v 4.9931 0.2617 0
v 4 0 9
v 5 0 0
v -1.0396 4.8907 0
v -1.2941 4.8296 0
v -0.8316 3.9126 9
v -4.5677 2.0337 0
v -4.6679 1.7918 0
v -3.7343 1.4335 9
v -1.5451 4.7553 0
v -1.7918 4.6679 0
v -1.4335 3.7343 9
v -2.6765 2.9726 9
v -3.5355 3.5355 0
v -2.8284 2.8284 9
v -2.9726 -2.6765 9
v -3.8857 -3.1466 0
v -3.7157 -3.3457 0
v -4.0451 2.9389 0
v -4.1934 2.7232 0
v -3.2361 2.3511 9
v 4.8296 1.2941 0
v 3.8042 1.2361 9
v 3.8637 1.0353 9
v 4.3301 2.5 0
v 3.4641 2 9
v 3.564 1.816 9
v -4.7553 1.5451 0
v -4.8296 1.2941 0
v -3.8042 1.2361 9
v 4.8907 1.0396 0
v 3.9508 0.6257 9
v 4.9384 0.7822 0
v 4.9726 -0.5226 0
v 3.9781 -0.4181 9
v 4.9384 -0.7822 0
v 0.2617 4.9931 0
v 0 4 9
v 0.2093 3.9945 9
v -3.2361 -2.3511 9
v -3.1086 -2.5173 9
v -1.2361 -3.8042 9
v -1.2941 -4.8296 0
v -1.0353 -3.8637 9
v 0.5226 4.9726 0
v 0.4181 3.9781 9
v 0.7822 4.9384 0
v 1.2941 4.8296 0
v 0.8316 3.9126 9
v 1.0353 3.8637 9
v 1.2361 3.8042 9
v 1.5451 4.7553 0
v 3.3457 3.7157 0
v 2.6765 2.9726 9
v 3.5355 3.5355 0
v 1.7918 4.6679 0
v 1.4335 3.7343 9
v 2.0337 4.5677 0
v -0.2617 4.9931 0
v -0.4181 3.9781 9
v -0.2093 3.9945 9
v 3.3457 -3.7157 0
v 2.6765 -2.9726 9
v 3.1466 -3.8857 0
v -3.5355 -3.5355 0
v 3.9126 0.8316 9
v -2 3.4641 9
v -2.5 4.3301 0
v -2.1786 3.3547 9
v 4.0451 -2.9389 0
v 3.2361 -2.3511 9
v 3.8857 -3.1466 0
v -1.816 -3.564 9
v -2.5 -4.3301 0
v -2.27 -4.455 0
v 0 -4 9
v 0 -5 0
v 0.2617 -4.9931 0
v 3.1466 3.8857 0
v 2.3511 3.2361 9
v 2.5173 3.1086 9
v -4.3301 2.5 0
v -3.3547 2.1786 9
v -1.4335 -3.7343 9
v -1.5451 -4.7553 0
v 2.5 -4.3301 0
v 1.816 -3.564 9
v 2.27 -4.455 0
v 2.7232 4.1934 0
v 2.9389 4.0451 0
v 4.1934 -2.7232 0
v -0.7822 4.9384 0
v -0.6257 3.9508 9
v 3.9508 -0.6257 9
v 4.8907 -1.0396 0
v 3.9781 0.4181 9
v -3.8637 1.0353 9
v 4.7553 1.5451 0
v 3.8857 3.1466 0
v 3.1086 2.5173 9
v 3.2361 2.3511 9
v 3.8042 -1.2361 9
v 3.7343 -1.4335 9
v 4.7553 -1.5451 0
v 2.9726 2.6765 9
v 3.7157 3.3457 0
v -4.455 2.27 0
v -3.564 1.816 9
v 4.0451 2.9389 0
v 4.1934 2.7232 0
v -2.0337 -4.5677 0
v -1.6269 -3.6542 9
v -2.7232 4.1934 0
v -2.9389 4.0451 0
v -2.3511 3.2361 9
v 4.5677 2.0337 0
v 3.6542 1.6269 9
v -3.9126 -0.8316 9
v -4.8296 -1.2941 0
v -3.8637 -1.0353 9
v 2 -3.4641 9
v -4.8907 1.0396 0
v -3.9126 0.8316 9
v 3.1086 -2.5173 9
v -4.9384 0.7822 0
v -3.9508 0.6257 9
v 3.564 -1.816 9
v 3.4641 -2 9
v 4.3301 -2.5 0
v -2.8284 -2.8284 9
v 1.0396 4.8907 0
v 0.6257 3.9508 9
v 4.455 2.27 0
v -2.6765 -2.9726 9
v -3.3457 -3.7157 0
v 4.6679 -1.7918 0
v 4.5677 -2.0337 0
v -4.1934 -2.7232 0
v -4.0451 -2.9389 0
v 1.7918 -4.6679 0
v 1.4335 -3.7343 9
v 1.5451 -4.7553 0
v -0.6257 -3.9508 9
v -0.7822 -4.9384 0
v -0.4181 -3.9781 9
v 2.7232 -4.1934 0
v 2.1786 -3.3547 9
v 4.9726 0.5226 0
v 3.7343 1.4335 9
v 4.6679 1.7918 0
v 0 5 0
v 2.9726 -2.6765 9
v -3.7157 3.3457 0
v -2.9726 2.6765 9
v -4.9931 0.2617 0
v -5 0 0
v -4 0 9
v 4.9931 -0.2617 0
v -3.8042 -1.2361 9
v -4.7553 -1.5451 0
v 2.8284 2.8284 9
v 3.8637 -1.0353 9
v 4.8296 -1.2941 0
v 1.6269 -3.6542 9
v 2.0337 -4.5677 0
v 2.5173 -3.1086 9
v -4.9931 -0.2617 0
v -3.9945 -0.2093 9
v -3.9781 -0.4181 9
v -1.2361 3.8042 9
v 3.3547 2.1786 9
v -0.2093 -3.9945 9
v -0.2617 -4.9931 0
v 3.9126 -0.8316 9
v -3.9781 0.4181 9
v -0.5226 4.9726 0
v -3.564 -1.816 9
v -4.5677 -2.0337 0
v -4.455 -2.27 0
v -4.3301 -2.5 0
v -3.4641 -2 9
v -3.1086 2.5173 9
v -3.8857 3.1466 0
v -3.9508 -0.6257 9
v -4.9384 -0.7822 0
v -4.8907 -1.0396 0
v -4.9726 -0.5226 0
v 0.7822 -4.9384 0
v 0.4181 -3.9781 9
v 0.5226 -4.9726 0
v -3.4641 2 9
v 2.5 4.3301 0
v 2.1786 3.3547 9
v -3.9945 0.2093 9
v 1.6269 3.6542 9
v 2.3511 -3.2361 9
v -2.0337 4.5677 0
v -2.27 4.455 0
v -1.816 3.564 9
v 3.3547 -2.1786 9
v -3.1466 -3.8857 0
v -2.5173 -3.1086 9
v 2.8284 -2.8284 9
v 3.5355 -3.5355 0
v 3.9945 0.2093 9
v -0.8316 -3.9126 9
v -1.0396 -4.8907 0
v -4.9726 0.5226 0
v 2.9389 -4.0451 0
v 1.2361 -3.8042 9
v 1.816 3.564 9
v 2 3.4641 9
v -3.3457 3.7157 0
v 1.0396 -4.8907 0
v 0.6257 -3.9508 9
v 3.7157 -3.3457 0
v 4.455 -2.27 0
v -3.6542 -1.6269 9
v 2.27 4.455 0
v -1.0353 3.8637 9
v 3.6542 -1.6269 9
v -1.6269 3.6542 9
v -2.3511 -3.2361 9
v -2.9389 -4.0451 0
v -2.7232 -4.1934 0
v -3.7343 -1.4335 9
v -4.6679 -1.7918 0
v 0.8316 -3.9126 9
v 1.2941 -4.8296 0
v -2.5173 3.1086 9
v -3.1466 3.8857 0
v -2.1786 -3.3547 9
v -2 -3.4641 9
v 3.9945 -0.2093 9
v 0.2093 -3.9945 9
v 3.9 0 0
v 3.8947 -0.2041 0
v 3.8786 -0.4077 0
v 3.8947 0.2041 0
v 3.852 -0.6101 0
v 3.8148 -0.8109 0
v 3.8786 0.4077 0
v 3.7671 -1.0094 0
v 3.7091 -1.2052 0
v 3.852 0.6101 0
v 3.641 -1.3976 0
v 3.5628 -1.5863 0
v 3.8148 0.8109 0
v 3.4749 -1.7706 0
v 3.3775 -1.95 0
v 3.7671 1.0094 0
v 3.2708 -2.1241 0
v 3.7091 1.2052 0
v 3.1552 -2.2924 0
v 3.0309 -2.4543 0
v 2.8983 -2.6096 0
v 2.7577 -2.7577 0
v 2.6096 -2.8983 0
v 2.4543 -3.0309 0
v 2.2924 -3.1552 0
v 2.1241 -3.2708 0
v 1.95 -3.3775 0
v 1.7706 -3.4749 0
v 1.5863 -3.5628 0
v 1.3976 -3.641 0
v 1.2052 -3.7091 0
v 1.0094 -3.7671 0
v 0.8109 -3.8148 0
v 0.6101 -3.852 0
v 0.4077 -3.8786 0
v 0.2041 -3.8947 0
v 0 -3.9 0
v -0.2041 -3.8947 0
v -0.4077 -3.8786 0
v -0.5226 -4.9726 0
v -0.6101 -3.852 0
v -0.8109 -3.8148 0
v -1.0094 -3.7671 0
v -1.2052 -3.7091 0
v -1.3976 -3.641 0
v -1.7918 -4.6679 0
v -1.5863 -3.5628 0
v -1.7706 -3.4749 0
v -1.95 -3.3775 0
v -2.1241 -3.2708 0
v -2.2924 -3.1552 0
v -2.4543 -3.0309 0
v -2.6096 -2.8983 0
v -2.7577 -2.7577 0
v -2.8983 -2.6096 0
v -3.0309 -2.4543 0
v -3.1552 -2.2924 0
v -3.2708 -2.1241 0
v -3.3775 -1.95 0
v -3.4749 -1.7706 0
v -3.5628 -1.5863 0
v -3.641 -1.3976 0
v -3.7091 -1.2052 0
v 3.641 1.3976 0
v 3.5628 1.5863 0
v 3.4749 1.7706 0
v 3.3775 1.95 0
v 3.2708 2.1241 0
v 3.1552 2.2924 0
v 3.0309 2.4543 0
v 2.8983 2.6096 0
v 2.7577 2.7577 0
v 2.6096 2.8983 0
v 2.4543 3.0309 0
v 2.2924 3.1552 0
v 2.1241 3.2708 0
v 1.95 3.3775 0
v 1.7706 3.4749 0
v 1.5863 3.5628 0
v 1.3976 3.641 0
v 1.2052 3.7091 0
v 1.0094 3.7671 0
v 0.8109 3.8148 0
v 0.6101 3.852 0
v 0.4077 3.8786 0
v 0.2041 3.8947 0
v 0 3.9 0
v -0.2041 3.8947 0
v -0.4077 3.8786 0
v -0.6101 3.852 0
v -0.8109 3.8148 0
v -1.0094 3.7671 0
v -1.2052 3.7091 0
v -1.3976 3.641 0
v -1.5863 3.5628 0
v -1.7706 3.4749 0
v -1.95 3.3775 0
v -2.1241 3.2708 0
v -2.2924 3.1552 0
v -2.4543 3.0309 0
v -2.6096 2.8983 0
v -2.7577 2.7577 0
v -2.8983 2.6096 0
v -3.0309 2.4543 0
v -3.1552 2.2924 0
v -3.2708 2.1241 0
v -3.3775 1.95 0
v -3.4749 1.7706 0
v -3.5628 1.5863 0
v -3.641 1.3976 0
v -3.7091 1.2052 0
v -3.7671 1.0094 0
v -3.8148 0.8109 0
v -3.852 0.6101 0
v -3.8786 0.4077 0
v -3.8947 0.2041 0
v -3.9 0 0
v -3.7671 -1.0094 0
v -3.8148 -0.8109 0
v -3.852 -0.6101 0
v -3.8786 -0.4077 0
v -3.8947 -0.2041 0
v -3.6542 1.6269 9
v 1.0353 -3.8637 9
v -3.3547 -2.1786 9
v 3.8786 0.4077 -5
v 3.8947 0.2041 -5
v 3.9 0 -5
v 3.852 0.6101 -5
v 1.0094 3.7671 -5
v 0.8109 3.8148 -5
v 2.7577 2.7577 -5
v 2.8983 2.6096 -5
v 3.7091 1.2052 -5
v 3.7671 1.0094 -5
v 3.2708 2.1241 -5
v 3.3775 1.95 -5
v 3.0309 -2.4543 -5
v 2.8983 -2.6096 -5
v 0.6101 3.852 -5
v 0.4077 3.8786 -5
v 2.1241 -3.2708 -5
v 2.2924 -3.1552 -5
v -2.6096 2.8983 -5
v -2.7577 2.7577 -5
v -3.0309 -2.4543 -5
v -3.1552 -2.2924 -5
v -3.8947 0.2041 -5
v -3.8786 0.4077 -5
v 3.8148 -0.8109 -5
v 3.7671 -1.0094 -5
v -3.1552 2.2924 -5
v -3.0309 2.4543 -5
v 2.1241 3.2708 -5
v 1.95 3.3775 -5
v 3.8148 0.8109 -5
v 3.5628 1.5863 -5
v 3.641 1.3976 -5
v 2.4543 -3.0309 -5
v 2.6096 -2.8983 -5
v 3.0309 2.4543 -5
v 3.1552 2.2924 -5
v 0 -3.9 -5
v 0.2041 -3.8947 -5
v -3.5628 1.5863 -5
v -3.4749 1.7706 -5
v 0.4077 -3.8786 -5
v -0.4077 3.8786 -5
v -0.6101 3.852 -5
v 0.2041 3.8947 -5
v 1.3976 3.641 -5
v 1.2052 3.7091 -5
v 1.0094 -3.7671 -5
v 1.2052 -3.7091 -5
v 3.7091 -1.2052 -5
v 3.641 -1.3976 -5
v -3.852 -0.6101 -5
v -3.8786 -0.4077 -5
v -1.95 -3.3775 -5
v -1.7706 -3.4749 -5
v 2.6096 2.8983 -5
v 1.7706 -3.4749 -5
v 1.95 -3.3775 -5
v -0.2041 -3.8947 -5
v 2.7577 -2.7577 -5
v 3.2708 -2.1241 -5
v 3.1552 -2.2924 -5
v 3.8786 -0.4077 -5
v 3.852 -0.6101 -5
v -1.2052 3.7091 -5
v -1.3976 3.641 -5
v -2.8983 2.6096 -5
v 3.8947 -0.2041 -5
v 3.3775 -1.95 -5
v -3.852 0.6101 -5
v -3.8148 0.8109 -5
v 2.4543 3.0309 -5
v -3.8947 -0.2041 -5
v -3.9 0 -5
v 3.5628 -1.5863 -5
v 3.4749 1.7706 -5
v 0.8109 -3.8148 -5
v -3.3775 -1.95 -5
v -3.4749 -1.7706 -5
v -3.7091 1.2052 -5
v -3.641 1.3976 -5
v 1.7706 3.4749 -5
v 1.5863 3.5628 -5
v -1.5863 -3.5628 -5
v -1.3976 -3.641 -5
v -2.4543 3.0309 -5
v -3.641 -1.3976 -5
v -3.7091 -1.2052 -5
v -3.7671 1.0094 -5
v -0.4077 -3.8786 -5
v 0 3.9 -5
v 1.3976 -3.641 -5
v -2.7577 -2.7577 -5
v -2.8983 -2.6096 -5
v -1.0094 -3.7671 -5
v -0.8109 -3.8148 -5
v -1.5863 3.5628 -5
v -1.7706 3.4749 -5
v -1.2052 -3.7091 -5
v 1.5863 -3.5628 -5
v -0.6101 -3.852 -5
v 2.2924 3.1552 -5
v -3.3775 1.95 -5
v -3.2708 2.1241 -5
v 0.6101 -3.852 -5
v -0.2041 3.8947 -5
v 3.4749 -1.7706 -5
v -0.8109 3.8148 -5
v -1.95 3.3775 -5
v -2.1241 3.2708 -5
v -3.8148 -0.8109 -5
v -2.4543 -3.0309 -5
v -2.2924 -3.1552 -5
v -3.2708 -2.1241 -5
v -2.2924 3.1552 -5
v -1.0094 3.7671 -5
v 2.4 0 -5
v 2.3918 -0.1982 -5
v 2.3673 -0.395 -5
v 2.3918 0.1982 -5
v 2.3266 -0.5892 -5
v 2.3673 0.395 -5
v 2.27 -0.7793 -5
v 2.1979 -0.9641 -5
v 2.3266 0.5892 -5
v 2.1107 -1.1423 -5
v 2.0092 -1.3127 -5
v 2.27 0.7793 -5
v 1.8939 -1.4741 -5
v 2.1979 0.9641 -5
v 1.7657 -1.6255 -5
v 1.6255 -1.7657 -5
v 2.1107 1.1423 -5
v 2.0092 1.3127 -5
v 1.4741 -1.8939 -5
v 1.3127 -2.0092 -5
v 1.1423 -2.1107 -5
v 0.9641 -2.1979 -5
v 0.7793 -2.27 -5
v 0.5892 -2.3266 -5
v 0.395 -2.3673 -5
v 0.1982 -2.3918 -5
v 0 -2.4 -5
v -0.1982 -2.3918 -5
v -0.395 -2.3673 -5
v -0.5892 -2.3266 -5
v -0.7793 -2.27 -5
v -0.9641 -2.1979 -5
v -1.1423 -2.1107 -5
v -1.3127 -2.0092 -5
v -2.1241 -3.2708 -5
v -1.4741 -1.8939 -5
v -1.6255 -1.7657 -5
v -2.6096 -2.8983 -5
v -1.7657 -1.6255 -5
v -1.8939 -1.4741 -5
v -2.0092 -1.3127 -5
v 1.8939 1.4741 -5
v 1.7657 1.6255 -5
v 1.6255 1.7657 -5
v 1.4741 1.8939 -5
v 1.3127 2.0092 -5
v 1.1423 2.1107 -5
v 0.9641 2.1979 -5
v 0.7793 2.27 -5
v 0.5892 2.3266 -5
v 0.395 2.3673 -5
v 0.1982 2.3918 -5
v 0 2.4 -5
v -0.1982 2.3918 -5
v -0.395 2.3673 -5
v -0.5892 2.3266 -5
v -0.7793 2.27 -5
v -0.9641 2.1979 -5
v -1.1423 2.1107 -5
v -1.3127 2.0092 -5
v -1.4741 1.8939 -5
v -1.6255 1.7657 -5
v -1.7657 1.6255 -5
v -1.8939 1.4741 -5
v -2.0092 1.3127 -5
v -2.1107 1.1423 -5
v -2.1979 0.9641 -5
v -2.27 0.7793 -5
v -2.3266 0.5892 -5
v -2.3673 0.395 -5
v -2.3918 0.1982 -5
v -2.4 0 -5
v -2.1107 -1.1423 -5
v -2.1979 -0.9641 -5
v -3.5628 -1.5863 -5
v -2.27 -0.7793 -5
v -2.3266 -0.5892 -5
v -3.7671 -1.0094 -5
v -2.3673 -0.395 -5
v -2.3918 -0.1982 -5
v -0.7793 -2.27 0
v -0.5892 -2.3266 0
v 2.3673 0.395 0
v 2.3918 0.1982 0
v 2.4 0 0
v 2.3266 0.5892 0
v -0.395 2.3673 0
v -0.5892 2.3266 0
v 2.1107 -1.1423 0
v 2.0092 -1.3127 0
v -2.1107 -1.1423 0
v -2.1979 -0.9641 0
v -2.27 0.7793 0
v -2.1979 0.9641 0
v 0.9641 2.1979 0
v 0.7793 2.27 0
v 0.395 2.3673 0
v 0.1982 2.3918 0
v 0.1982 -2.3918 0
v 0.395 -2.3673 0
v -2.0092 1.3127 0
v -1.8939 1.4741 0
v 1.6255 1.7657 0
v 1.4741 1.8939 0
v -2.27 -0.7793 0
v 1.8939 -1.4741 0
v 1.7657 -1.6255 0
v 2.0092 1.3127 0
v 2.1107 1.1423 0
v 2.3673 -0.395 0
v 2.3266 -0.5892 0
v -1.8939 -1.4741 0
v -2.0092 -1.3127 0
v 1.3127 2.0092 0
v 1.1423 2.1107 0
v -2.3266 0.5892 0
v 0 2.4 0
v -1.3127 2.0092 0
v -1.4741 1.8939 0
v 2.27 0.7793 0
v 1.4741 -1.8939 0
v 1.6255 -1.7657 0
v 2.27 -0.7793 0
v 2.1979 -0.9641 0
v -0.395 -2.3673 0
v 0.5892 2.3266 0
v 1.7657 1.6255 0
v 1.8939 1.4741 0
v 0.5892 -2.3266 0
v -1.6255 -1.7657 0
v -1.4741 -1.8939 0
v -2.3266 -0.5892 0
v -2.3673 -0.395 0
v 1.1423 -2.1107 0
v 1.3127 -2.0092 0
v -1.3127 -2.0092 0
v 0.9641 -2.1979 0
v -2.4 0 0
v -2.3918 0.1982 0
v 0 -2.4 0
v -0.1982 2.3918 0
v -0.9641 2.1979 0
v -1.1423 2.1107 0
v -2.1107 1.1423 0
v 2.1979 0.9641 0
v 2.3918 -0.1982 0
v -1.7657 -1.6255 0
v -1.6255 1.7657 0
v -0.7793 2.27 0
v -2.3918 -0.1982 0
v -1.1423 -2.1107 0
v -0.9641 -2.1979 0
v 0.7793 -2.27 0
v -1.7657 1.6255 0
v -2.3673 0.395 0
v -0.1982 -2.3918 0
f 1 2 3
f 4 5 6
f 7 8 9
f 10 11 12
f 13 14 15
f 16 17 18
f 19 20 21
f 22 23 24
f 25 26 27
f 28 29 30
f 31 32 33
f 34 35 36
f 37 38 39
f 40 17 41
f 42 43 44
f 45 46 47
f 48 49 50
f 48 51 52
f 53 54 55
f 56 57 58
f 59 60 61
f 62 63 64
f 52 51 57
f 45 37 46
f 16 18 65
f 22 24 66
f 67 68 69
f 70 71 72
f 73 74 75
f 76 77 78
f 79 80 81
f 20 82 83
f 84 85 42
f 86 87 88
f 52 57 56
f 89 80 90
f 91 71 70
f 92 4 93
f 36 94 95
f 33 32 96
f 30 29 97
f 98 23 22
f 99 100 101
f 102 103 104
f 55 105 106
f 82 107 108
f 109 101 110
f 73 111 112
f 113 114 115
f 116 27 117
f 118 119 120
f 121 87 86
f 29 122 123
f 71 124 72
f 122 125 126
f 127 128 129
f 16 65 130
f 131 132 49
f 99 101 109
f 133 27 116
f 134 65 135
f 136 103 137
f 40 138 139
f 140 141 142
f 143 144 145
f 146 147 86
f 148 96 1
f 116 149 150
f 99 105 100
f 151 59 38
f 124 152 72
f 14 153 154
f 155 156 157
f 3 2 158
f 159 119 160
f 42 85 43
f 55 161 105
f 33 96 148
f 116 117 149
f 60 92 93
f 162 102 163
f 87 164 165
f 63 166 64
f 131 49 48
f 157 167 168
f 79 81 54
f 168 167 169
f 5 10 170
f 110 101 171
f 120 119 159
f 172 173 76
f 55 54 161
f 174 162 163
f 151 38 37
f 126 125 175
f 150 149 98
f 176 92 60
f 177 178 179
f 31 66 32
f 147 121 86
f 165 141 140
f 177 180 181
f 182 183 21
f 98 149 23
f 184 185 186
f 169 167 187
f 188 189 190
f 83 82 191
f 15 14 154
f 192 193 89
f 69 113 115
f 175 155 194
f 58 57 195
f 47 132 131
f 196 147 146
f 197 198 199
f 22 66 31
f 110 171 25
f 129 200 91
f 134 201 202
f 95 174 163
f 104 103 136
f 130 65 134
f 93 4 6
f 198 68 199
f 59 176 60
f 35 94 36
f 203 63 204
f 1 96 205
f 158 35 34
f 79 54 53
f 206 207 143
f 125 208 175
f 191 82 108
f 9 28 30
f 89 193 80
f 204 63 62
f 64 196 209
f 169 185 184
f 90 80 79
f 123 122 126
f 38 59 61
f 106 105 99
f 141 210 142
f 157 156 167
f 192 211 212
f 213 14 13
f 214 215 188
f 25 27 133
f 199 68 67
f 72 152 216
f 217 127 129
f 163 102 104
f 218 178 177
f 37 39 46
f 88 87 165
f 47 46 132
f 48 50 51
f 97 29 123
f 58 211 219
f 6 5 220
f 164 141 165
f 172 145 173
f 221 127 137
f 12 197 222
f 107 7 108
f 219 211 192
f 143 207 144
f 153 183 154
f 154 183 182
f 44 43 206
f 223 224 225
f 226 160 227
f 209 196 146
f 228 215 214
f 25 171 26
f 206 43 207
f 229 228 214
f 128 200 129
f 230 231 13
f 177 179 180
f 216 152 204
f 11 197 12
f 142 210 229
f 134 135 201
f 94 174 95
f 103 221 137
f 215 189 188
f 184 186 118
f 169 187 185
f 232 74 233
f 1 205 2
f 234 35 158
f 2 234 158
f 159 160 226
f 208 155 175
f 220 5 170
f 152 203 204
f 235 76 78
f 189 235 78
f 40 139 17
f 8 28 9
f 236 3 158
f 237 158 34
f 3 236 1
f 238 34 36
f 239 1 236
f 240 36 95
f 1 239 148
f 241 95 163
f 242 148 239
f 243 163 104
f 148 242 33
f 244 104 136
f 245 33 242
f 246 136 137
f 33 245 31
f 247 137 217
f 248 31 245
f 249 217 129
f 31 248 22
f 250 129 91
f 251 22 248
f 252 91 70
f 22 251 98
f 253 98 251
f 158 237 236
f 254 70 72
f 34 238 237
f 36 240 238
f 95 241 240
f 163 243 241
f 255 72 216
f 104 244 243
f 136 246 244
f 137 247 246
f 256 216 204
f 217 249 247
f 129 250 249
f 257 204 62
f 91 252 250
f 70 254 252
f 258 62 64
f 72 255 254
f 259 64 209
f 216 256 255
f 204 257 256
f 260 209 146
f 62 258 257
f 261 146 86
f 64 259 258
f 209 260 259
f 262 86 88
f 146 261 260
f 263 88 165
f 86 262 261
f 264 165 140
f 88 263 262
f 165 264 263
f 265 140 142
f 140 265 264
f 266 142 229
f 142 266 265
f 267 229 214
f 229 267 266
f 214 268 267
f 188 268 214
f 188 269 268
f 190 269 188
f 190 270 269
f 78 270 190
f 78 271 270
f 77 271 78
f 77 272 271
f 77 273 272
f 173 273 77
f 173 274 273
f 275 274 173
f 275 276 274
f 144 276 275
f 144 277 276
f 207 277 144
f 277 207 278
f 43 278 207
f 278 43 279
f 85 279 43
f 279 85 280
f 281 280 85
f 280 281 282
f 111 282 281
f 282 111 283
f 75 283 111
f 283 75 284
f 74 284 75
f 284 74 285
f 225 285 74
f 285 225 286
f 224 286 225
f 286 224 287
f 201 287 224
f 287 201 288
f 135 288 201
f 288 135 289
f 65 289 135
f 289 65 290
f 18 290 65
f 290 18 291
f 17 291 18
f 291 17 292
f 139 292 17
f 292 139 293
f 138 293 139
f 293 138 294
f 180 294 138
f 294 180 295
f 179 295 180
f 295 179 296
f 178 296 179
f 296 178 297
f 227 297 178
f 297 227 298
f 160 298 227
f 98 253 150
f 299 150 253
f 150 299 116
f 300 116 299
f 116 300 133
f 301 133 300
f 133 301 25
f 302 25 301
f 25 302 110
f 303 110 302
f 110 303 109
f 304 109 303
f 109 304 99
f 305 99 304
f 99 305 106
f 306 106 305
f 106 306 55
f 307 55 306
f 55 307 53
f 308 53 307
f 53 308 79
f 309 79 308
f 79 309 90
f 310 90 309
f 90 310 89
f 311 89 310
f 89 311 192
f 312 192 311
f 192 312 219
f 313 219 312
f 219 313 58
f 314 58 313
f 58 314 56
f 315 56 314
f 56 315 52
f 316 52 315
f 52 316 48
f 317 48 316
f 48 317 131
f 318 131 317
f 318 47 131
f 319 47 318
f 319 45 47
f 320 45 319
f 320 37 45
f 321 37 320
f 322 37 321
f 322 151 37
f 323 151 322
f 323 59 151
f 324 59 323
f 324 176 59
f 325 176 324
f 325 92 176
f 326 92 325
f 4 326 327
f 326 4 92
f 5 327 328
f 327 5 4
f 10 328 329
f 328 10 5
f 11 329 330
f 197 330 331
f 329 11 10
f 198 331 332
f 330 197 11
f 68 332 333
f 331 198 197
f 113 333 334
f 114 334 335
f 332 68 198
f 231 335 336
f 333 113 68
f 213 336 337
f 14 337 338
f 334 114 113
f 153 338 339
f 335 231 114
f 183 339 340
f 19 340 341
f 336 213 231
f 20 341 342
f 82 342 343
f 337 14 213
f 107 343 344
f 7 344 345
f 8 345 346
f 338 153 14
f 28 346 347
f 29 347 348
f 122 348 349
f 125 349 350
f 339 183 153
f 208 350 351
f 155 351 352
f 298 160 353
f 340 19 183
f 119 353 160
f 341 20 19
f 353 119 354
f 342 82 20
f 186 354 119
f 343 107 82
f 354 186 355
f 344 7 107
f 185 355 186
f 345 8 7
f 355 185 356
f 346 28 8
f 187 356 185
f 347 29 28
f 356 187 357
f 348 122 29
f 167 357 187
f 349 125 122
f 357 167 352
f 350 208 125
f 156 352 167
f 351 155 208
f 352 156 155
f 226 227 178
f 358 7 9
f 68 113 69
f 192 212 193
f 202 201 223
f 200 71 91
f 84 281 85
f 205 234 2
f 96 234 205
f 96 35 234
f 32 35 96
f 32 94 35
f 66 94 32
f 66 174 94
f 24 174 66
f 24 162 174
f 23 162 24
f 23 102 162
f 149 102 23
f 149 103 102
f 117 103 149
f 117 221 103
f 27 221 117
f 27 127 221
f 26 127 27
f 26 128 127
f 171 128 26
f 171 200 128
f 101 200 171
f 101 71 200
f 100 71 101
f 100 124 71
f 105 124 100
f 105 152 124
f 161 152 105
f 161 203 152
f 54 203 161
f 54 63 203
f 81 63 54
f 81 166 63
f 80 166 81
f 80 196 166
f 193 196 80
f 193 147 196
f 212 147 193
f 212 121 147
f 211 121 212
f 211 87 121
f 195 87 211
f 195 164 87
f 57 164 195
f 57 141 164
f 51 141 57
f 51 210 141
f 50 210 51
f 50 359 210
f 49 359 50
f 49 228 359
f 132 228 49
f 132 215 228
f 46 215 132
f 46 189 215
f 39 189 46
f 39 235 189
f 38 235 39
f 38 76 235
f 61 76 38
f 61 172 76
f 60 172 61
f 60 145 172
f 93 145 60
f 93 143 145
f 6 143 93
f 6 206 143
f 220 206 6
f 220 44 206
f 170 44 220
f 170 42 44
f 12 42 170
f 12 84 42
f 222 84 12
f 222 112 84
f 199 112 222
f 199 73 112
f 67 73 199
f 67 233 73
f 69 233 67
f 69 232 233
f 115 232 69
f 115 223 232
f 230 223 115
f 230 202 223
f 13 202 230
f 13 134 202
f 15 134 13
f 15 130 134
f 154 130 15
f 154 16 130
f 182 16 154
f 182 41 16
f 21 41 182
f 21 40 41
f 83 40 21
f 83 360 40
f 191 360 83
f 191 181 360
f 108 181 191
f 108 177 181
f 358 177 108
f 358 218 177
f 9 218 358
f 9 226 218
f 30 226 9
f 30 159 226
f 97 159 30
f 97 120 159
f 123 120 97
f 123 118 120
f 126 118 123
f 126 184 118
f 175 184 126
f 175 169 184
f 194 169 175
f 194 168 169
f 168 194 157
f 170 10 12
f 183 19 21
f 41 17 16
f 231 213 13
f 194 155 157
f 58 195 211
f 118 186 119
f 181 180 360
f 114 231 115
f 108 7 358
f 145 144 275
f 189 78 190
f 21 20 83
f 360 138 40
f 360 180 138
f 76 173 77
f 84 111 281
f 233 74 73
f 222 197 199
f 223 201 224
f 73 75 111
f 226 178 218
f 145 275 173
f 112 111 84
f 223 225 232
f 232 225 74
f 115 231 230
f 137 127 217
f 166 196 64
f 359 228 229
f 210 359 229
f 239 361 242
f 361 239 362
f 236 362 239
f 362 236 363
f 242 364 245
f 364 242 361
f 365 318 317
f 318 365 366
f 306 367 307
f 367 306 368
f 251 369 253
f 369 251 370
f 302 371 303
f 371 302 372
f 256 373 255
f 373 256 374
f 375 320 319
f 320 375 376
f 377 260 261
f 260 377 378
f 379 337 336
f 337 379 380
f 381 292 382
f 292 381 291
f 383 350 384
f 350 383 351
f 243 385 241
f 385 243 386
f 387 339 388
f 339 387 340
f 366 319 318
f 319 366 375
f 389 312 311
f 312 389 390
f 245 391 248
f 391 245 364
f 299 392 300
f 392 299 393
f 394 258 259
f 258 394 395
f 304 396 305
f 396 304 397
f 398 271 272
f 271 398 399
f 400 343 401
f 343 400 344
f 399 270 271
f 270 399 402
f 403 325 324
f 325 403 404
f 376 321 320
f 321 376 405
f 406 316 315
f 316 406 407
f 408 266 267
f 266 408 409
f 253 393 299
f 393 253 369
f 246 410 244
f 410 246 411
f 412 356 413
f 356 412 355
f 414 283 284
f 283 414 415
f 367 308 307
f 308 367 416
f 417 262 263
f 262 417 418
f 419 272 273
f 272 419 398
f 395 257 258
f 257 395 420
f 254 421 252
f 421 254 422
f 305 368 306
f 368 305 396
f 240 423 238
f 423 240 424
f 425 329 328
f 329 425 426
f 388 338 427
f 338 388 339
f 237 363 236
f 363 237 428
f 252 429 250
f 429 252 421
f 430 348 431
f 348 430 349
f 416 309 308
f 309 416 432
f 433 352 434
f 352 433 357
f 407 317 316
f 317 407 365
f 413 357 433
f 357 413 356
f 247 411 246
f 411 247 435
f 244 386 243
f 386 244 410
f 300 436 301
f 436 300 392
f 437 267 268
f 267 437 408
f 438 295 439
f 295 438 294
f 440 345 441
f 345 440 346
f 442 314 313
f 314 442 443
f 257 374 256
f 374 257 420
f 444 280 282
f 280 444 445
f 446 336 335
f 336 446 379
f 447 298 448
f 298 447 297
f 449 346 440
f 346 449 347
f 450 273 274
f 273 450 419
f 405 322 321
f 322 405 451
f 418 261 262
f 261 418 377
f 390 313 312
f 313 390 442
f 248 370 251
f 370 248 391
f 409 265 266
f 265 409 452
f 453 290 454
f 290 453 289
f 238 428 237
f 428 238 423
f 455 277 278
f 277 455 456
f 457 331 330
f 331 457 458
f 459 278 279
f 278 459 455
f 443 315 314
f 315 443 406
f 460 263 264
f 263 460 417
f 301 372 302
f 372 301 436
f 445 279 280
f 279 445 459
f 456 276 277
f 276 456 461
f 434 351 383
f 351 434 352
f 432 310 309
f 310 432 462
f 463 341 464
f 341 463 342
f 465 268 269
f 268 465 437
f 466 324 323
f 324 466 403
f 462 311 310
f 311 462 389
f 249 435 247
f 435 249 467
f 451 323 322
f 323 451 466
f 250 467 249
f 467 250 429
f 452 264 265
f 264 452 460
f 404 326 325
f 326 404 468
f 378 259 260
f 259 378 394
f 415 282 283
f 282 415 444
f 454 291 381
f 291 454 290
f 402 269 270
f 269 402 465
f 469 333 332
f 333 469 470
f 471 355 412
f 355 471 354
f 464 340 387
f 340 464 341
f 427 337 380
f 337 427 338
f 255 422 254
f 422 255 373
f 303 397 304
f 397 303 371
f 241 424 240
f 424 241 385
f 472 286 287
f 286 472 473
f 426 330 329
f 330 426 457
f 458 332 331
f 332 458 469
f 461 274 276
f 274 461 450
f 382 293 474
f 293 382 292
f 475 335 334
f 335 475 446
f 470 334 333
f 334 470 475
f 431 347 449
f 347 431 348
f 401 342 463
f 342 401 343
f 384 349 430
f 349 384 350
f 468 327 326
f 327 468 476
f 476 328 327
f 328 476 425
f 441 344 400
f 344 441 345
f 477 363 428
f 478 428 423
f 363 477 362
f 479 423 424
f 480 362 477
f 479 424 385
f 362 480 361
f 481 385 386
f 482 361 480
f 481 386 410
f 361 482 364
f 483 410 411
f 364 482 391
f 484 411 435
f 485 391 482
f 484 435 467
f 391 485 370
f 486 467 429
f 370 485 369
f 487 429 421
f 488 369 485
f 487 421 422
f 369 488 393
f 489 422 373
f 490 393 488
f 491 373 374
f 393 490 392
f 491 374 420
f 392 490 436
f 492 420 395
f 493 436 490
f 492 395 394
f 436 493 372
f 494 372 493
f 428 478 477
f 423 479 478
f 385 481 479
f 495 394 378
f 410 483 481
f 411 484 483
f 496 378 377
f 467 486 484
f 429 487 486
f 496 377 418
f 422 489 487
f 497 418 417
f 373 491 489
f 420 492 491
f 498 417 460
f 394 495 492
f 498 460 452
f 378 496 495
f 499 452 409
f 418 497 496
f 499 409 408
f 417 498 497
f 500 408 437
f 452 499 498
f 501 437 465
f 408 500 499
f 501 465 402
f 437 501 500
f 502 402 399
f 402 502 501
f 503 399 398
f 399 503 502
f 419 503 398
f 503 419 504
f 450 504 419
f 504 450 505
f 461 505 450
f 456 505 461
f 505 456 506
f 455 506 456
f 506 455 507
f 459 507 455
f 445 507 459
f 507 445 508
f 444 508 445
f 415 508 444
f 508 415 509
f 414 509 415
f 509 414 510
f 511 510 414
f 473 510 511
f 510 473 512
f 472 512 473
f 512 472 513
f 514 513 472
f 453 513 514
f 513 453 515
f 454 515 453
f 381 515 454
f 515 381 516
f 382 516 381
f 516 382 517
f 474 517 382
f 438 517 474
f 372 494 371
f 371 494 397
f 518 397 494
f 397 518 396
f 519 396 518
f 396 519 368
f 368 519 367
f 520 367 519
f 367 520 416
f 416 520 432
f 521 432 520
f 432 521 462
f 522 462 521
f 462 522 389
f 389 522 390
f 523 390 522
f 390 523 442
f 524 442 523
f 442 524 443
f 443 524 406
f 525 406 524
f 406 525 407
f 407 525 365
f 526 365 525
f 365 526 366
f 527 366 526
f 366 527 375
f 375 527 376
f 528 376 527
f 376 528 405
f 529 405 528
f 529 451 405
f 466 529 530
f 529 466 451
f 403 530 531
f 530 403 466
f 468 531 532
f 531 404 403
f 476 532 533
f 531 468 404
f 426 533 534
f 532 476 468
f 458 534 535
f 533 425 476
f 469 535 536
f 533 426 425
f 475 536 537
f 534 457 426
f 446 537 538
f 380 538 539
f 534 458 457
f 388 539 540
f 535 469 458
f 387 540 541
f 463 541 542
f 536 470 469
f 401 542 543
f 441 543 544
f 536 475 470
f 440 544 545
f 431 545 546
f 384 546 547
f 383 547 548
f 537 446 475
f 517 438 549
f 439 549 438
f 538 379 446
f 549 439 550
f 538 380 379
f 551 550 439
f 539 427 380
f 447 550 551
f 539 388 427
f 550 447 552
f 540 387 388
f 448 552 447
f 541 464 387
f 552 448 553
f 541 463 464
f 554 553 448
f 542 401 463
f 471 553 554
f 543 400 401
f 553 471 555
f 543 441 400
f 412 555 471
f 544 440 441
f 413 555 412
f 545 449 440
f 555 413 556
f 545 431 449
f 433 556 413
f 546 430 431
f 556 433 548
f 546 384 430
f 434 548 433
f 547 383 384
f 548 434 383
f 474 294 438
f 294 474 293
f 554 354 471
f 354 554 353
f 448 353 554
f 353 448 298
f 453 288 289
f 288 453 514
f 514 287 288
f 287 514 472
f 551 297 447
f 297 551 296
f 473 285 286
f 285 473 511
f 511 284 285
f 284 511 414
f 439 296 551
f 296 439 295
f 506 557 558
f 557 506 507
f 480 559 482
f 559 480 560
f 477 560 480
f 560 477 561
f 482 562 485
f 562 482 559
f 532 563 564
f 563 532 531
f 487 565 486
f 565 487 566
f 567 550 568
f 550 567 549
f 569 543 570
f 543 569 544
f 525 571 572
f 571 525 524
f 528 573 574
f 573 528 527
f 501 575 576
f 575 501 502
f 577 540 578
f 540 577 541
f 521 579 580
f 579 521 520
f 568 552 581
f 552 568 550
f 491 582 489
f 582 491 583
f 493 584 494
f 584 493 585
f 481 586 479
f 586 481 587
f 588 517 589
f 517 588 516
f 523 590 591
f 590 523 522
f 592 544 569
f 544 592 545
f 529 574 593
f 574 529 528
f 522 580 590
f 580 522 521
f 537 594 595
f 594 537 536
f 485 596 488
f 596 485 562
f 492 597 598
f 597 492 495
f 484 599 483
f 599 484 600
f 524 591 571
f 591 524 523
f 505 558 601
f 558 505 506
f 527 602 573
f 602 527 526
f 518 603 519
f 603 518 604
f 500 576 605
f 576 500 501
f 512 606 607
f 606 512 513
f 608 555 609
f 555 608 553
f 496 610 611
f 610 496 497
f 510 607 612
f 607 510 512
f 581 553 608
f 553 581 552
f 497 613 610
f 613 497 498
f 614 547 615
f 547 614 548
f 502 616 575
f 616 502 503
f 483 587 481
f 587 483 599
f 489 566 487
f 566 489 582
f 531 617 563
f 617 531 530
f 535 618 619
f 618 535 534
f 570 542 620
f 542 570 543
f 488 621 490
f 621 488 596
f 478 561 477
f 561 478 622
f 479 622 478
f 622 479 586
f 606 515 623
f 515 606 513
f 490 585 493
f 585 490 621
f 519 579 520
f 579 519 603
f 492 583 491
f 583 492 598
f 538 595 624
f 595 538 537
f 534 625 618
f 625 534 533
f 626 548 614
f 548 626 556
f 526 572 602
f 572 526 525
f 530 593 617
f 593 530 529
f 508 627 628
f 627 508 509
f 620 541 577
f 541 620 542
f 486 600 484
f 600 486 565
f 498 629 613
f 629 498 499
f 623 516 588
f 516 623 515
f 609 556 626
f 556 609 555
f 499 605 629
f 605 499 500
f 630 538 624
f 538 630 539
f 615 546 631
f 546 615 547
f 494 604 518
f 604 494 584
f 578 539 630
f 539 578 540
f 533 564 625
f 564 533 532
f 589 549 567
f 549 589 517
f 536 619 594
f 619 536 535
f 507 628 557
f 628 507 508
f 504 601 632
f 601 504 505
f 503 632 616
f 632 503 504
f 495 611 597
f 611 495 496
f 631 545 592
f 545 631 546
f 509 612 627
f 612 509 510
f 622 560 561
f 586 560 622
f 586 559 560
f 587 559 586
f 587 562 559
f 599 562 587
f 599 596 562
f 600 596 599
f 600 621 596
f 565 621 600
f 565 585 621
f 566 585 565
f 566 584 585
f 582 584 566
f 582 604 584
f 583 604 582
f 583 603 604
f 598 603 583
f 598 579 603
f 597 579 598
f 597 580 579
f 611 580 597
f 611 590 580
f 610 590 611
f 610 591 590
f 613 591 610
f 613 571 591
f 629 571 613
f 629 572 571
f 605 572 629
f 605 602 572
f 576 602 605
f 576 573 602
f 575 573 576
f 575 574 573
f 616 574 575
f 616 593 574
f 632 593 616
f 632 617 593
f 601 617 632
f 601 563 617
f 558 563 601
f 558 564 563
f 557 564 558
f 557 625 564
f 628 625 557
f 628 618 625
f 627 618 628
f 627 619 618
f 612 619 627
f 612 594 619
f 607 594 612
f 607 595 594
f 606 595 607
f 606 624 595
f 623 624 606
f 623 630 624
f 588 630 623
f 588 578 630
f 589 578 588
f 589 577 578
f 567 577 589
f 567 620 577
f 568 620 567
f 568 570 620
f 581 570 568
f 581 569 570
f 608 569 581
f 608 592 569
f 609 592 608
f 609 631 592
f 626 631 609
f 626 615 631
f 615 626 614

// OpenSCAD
$fa=3;
$fs=0.2;
module tapered(h,r1,r2)
{
echo("H=",h);
echo("R1=",r1);
echo("r2=",r2);    
    //cylinder(h=9.3,r1=4.3,r2=4);
    cylinder(h=h,r1=r1,r2=r2);
    
}
//intended to push idler pulley out from idler_end slightly to align with motor shaft
module pulley_spacer() {
difference()
{
    union(){
        tapered(9,5,4);
        translate([0,0,-5.0])
        cylinder(r=7.8/2,h=5.0);
    }
    translate([0,0,-150])
    cylinder(r=2.4,h=300,center=true);
}
}
pulley_spacer();
